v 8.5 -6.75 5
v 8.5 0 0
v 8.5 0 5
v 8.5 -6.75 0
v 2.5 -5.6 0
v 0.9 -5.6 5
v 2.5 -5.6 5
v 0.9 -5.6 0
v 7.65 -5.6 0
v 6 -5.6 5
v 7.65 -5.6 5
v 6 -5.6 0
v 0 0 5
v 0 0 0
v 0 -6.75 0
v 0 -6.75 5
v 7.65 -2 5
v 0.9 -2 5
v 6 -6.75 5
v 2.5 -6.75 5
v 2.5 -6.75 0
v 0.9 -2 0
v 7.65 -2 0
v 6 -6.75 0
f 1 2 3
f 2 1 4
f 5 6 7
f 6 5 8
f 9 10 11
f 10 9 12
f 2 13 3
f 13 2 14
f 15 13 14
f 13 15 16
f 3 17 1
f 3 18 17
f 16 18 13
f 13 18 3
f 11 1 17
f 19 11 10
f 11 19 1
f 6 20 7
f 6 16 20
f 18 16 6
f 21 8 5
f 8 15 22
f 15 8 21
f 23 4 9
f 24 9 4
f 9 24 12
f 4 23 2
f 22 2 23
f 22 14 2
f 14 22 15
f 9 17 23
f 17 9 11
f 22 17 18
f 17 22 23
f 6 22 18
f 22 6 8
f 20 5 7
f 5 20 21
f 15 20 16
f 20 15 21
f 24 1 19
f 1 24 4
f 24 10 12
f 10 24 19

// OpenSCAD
rotate([90,0,0])
union(){

	difference(){
		resize([8.5,5,5.6])
		cube(2);
		translate([.9,0,2])
		resize([6.75,5,5.7])
		cube(2);
	}//end difference
	translate([0,0,5.6])
	resize([2.5,5,1.15])
	cube(2);

	translate([6,0,5.6])
	resize([2.5,5,1.15])
	cube(2);
}//end union
